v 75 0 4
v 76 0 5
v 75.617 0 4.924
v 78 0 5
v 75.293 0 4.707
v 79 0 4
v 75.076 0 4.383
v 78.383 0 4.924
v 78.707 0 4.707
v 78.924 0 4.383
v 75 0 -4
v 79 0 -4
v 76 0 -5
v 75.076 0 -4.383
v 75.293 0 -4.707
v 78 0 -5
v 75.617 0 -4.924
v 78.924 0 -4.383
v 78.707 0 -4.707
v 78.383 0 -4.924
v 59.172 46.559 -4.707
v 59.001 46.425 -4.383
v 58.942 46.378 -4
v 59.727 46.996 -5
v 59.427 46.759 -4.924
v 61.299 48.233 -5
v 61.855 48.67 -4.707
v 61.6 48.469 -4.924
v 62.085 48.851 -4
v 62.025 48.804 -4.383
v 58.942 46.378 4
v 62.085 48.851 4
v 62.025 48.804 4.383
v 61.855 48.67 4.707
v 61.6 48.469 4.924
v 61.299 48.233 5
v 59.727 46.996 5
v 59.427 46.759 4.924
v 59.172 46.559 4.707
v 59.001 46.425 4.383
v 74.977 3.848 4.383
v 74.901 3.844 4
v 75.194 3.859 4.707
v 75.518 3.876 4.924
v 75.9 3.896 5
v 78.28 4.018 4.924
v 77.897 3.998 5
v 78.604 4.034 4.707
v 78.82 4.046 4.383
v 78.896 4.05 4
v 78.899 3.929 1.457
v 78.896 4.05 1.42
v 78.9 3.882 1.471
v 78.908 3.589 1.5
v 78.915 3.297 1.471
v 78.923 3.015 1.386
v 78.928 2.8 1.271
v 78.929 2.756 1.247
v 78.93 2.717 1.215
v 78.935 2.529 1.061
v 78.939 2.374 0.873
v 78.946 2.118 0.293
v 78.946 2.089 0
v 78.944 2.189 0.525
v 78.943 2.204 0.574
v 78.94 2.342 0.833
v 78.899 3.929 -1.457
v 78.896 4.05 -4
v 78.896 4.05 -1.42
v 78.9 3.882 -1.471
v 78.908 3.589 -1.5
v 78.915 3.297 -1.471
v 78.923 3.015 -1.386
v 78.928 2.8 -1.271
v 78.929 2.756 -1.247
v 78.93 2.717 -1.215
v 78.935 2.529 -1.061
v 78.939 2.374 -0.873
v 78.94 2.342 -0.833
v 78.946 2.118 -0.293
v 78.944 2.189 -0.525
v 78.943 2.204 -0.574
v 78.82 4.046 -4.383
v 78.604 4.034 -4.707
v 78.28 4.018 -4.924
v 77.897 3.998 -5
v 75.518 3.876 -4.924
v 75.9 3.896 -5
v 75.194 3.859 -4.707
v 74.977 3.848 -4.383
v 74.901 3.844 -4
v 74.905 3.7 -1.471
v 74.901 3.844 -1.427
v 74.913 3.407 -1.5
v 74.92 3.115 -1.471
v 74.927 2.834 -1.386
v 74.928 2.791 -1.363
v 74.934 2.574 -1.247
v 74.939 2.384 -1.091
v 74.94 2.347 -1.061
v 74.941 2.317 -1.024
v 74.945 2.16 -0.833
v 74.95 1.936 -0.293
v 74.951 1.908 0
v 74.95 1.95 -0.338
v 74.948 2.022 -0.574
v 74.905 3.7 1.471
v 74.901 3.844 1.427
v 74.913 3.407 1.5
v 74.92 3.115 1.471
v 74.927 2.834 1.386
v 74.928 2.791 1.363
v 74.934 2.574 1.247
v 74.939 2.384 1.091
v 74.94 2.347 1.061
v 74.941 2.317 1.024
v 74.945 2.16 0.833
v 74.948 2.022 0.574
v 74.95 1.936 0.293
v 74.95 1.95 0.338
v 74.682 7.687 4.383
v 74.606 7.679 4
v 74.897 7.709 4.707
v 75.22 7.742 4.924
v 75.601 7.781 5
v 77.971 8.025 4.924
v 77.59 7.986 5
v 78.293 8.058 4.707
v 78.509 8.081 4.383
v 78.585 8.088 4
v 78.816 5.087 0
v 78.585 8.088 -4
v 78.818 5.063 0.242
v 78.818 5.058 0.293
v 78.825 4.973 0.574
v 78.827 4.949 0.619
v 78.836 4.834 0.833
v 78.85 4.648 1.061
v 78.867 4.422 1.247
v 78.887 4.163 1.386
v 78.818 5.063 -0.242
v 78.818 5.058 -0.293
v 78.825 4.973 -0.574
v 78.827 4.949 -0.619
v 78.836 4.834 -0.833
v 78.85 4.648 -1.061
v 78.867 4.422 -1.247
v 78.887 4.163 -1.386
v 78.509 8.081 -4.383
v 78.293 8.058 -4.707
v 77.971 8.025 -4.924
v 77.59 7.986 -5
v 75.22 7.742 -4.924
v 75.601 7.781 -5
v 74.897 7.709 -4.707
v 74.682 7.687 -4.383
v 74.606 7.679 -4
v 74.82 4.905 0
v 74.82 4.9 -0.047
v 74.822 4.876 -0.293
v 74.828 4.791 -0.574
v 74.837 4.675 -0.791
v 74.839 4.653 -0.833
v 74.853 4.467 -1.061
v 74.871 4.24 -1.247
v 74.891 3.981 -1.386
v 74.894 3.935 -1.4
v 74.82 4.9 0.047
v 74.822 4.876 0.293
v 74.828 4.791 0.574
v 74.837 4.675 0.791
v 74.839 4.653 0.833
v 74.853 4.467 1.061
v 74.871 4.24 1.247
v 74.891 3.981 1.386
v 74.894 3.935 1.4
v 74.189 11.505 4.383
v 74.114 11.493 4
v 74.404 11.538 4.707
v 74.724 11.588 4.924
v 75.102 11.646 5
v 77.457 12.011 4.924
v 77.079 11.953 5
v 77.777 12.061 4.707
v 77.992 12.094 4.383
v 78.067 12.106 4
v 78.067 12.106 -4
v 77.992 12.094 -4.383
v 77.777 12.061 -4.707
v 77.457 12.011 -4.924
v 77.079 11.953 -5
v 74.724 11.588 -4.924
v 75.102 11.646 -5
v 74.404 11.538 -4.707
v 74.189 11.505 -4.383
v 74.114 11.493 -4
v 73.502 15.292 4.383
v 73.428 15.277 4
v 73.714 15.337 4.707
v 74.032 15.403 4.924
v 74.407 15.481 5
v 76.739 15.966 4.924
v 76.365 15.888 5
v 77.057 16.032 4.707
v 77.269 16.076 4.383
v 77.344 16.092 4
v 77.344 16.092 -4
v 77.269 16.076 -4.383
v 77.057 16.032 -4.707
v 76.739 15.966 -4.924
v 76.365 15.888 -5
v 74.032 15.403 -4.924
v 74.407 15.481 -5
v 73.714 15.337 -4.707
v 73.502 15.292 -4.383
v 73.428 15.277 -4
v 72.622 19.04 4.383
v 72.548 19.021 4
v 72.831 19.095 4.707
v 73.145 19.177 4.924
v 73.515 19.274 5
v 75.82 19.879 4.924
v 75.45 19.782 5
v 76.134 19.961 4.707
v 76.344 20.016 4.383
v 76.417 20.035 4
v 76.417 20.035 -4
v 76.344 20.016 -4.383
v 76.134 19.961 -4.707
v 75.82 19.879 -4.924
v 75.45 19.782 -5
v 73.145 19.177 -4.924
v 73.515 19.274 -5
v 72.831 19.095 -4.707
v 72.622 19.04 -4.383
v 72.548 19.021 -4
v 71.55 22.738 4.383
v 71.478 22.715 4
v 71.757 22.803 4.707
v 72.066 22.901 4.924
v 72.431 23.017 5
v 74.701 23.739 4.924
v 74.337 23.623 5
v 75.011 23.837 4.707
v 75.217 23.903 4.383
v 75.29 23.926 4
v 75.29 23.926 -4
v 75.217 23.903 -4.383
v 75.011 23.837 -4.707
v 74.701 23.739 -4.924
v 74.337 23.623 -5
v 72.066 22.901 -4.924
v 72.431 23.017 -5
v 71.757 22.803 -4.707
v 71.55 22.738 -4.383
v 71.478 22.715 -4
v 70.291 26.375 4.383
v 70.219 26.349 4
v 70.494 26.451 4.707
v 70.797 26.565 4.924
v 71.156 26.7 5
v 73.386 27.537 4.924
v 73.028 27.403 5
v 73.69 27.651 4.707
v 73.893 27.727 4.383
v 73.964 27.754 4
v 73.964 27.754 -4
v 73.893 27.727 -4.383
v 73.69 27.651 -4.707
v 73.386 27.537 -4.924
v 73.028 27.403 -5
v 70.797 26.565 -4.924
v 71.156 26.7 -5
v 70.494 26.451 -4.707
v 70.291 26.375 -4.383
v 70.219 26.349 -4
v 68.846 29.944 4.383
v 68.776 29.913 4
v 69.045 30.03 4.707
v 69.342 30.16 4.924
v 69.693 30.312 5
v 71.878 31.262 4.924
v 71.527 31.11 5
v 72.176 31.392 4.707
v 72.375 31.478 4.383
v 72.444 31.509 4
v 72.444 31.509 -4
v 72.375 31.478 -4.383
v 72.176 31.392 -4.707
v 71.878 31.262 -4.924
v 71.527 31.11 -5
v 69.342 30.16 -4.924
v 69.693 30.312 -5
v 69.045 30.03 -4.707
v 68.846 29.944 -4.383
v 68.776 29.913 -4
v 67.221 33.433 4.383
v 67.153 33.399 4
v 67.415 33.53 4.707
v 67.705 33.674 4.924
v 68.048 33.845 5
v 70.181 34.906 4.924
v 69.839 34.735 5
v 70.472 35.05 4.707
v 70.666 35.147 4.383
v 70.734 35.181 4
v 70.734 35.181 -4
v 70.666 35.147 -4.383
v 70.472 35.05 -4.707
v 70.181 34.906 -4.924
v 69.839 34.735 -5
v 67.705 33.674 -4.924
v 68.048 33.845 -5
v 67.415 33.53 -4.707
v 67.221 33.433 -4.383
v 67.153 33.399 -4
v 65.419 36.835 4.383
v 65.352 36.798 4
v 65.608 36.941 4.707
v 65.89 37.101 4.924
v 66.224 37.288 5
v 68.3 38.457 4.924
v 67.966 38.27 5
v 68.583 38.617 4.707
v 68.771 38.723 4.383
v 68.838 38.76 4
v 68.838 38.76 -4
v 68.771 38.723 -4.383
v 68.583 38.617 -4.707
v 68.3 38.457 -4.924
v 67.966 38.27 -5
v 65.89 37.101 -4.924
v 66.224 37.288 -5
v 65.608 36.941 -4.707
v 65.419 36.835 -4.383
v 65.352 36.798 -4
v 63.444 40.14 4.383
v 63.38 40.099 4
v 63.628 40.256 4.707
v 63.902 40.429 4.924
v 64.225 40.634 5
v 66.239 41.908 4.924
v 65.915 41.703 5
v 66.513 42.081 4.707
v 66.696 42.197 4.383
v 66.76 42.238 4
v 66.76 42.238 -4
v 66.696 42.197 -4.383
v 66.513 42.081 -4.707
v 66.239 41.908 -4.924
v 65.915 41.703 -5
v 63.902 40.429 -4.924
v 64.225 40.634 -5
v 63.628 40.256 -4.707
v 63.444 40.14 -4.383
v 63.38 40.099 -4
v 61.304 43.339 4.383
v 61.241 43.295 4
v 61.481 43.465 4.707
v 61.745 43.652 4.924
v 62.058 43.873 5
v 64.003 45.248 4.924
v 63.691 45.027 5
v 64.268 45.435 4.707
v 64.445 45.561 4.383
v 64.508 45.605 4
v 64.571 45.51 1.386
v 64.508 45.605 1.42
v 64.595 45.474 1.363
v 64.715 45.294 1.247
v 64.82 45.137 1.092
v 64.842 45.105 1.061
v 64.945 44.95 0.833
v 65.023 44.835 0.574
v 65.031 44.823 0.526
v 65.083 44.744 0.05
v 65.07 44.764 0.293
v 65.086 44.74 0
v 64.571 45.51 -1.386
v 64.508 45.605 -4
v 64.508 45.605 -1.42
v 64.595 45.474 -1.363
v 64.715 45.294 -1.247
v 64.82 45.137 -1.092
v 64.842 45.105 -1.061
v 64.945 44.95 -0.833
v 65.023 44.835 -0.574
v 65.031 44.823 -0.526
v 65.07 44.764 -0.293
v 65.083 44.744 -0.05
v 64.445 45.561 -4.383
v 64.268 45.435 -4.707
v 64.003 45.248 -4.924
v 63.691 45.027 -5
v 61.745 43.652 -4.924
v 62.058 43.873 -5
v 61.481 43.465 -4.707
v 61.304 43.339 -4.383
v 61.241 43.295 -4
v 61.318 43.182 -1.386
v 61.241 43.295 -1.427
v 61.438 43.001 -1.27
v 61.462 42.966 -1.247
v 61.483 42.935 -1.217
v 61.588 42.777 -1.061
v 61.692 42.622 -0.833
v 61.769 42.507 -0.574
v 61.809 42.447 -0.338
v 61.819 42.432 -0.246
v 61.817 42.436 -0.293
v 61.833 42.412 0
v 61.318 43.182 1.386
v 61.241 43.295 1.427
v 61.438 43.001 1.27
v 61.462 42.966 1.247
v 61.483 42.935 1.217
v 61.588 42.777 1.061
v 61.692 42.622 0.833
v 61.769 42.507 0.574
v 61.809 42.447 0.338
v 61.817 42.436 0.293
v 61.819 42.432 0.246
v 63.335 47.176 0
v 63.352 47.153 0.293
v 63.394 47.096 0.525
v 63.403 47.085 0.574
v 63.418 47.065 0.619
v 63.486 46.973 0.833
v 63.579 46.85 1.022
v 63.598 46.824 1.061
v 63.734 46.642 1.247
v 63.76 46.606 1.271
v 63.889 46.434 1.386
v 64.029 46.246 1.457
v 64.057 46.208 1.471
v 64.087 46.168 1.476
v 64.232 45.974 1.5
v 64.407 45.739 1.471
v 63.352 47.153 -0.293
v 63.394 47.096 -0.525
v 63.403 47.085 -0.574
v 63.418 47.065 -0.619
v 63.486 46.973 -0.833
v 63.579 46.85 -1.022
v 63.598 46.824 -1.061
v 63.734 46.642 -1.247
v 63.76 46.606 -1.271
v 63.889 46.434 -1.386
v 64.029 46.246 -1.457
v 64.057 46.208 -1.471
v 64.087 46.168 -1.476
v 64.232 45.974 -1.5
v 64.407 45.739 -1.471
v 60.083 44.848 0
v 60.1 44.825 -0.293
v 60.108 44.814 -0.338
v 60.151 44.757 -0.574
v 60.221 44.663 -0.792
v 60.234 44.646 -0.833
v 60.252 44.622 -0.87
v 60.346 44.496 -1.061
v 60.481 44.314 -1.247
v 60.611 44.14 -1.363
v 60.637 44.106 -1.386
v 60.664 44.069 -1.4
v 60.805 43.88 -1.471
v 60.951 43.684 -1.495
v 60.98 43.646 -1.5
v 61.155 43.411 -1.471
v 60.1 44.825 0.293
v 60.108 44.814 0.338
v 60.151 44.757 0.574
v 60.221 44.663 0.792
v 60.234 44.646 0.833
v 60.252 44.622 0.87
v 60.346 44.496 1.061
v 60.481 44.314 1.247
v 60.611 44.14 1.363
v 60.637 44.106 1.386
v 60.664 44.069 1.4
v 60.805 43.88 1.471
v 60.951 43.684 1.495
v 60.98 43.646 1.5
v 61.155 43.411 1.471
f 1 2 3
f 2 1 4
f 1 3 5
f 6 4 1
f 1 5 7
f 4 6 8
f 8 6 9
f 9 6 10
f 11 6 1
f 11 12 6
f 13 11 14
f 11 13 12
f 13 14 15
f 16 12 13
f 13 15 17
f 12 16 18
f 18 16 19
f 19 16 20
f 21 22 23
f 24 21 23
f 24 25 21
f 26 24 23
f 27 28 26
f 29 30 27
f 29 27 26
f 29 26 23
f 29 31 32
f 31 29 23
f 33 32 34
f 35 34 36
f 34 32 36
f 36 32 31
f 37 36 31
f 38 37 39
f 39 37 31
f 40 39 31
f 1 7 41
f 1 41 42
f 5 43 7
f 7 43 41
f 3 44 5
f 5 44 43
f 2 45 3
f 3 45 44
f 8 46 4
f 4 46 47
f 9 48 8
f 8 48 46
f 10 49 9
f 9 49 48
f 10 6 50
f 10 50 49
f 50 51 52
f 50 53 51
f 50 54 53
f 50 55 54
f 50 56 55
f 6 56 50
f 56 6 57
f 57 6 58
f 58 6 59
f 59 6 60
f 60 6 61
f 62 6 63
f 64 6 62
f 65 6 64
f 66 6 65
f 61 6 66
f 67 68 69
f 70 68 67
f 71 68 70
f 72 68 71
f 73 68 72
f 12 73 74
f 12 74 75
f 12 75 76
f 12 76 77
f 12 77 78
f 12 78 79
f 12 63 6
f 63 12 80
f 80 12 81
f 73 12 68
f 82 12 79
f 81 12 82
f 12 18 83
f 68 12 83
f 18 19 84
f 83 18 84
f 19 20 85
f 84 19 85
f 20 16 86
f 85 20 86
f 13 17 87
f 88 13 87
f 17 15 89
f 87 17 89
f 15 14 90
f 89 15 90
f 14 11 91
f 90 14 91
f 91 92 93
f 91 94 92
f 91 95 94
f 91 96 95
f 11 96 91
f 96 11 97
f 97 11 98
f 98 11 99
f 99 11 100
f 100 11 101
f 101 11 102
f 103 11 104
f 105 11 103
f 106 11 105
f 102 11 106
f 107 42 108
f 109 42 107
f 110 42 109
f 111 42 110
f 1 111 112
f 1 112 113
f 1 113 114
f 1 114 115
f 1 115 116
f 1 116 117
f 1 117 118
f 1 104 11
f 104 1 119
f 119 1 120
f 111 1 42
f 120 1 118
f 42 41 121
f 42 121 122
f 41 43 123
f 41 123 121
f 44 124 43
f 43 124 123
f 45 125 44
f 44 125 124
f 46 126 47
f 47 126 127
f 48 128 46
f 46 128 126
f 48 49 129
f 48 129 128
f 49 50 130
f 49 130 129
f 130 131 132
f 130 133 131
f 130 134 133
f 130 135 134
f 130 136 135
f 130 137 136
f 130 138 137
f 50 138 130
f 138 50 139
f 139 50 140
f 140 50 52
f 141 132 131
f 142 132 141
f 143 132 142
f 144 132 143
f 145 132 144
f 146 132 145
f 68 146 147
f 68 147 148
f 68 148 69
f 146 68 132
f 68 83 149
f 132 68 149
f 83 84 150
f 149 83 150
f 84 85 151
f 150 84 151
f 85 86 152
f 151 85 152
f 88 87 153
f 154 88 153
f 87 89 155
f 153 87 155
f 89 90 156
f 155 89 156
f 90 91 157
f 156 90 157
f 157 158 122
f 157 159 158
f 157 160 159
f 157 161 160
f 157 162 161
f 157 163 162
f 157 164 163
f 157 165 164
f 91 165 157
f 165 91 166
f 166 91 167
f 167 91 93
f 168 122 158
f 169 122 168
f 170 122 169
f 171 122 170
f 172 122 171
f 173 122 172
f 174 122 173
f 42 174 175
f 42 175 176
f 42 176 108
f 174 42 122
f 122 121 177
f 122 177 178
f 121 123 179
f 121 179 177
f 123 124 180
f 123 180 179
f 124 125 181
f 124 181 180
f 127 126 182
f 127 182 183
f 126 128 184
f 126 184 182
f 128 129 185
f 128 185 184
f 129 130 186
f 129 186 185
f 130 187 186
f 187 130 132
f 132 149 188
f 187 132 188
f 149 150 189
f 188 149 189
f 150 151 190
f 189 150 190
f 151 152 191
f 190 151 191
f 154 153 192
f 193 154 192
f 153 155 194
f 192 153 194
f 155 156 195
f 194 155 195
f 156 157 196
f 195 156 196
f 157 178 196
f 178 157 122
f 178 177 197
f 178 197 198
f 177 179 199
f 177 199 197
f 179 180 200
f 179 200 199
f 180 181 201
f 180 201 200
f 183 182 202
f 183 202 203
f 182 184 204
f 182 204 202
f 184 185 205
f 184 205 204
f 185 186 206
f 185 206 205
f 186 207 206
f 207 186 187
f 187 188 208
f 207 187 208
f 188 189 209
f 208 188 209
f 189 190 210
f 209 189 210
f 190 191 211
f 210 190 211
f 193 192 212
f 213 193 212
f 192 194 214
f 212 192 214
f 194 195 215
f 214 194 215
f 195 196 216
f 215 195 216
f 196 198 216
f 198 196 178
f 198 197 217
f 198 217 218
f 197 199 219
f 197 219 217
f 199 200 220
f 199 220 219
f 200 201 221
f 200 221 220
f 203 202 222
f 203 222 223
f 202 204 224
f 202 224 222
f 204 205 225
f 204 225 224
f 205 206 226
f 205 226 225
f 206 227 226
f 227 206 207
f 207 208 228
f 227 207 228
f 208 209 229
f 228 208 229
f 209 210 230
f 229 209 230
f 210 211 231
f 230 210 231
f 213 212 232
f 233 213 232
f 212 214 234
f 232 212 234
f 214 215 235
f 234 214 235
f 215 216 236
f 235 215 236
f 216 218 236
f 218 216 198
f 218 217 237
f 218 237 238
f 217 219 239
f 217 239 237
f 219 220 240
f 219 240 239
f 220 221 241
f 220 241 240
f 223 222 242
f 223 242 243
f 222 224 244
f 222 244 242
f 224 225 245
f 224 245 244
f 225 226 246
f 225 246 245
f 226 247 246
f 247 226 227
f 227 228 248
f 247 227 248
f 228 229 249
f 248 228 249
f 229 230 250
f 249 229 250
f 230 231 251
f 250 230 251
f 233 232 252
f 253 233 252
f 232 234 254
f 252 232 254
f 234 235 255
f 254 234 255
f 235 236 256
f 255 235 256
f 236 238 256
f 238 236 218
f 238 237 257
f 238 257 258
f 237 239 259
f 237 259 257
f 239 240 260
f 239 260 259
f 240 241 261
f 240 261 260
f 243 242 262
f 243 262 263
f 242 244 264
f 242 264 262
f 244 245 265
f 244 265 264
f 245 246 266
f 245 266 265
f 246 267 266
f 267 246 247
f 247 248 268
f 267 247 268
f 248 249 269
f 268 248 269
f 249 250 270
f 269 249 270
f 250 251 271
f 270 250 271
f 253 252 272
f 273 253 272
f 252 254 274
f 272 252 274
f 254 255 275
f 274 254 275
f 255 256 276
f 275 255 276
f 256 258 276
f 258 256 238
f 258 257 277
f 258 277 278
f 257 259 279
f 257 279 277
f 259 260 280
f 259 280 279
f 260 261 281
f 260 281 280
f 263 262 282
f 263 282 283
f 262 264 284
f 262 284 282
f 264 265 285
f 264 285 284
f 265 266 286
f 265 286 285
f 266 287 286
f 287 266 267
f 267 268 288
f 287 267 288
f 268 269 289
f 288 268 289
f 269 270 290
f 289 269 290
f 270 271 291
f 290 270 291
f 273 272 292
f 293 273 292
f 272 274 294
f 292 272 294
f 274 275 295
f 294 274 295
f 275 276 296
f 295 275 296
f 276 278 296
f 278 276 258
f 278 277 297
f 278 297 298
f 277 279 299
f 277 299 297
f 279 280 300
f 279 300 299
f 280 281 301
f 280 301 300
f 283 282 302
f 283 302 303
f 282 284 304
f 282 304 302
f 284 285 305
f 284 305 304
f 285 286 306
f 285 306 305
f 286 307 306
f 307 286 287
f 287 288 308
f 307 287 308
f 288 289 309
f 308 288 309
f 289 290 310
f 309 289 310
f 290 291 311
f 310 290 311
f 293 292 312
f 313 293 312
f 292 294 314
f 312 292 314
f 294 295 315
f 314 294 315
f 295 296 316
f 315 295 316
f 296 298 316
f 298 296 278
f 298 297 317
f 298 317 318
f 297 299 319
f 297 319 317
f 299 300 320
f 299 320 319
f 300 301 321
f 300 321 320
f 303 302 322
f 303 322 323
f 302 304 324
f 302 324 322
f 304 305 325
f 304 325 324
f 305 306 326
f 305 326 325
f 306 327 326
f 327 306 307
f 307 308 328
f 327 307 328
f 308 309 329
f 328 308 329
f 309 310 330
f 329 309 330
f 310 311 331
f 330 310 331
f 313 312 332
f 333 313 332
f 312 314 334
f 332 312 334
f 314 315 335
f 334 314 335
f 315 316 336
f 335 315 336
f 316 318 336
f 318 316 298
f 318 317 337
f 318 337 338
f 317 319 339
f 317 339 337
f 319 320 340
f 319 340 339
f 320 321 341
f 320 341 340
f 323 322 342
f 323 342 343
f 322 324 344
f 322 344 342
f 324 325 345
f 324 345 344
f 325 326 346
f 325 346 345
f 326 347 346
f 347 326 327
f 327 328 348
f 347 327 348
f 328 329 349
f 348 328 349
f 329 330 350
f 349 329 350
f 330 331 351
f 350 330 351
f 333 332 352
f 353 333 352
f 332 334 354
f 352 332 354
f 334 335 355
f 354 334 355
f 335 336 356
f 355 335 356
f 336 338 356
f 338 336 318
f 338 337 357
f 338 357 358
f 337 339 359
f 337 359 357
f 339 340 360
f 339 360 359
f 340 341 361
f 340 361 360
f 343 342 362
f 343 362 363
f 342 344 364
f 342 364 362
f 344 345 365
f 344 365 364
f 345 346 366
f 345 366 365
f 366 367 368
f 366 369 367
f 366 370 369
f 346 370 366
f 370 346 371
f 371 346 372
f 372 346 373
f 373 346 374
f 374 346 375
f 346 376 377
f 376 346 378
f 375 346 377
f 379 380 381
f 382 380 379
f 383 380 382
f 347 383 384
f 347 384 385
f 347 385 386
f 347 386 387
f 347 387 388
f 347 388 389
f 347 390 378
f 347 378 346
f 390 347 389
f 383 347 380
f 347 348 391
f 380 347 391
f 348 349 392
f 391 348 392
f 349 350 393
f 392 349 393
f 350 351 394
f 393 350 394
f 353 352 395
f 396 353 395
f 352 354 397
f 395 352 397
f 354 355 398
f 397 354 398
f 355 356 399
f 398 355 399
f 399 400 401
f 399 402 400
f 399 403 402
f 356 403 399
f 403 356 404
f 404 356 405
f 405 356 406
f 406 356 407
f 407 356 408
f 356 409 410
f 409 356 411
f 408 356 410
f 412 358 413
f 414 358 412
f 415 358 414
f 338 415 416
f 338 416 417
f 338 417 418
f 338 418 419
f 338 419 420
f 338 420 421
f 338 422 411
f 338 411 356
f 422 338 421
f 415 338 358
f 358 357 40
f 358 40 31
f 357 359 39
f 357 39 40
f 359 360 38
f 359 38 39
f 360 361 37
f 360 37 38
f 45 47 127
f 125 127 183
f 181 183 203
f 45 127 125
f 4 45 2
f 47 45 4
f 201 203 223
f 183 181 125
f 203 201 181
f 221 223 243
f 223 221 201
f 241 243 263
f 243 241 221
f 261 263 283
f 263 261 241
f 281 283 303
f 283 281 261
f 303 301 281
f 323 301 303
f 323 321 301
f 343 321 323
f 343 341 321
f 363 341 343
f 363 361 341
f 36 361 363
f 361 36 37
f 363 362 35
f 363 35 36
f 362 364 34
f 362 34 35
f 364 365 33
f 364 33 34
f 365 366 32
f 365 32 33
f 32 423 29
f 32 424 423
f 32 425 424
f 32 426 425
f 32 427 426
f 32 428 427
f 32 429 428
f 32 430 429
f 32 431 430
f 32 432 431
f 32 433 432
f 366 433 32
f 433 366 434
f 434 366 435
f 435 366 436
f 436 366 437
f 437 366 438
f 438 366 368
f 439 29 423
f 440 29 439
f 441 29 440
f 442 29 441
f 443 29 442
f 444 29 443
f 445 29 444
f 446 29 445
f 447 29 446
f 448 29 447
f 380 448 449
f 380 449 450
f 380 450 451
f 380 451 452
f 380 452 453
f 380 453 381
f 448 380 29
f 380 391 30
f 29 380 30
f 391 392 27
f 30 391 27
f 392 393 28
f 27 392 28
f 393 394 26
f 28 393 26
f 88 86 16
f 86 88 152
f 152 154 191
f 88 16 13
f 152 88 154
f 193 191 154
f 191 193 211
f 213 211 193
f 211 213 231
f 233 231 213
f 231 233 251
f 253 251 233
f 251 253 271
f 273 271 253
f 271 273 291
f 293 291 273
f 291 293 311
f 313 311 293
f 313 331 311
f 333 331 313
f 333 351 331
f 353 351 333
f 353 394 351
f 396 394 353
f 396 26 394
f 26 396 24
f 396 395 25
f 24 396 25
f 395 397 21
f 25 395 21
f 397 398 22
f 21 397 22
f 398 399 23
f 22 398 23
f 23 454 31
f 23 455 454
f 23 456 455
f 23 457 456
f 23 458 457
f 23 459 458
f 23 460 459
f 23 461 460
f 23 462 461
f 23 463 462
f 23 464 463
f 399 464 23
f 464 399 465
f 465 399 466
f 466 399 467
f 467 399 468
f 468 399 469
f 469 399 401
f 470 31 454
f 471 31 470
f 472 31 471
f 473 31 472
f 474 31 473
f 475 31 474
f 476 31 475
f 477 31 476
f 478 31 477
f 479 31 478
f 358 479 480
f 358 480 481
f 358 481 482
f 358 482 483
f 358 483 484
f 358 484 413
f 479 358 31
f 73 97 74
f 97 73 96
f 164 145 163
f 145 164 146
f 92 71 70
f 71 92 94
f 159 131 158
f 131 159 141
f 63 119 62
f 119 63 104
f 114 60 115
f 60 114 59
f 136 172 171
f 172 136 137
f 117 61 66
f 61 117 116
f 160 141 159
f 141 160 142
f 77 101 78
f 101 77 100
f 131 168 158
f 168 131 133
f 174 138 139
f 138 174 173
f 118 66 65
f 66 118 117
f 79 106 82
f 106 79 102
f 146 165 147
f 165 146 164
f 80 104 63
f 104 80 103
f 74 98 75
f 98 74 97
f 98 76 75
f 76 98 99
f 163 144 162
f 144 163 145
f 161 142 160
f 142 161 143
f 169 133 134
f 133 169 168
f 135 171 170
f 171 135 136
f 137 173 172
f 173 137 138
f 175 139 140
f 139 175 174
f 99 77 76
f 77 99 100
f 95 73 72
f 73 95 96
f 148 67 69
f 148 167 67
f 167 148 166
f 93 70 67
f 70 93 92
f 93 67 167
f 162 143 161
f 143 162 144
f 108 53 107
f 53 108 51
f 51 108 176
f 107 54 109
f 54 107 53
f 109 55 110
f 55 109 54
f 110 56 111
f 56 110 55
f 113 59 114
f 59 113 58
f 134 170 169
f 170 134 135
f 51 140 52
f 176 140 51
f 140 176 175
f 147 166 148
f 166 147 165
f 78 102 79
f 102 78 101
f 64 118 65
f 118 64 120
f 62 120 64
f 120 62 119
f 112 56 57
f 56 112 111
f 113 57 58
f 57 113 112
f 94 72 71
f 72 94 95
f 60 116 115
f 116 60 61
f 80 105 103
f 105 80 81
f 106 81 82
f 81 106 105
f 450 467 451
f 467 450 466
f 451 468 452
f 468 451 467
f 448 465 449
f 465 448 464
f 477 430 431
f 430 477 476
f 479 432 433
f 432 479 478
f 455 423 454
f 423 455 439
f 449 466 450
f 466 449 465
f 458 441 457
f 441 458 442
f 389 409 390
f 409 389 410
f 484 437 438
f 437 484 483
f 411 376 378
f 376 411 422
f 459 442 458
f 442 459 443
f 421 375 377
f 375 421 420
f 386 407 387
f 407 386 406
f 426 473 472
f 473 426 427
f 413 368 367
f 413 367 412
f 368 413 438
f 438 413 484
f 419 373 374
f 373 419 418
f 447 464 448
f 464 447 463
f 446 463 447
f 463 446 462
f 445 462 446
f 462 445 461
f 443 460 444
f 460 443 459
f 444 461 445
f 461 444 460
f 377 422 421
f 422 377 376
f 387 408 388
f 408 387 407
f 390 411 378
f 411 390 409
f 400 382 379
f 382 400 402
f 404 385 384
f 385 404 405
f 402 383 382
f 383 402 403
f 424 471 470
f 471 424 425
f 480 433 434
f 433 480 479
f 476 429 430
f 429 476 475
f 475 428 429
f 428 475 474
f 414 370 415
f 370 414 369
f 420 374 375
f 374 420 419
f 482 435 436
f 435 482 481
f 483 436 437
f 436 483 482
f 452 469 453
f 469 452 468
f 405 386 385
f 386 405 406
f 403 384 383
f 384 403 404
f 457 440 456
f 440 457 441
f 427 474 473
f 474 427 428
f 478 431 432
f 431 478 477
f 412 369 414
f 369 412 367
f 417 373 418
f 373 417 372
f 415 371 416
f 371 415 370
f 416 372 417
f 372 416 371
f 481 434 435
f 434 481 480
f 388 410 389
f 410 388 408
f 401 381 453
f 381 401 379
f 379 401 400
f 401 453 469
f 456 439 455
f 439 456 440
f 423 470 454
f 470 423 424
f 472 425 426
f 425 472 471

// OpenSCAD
// Gourmette — curved bar piece for chain bracelet

// Parameters
bar_length = 50; // arc length in mm
bar_width = 10; // bar width (across the curve)
bar_thickness = 4; // bar thickness
bend_radius = 75; // radius of curvature (larger = flatter bend)
hole_diameter = 3; // chain attachment hole diameter
hole_inset = 3.5; // distance from each end to hole center
corner_radius = 1; // edge rounding

// Derived
arc_angle = (bar_length / (2 * PI * bend_radius)) * 360;
mid_radius = bend_radius + bar_thickness / 2;
hole_inset_angle = (hole_inset / (2 * PI * mid_radius)) * 360;

module bar_profile() {
  r = corner_radius;
  hull()for (x = [bend_radius + r, bend_radius + bar_thickness - r])
    for (y = [-bar_width / 2 + r, bar_width / 2 - r])
      translate([x, y]) circle(r=r, $fn=16);
}

module gourmette() {
  difference() {
    rotate_extrude(angle=arc_angle, $fn=128)
      bar_profile();

    // Hole near start end — radial (front to back through thickness)
    rotate([0, 0, hole_inset_angle])
      translate([mid_radius, 0, 0])
        rotate([0, 90, 0])
          cylinder(d=hole_diameter, h=bar_thickness + 2, center=true, $fn=32);

    // Hole near far end — radial (front to back through thickness)
    rotate([0, 0, arc_angle - hole_inset_angle])
      translate([mid_radius, 0, 0])
        rotate([0, 90, 0])
          cylinder(d=hole_diameter, h=bar_thickness + 2, center=true, $fn=32);
  }
}

gourmette();
